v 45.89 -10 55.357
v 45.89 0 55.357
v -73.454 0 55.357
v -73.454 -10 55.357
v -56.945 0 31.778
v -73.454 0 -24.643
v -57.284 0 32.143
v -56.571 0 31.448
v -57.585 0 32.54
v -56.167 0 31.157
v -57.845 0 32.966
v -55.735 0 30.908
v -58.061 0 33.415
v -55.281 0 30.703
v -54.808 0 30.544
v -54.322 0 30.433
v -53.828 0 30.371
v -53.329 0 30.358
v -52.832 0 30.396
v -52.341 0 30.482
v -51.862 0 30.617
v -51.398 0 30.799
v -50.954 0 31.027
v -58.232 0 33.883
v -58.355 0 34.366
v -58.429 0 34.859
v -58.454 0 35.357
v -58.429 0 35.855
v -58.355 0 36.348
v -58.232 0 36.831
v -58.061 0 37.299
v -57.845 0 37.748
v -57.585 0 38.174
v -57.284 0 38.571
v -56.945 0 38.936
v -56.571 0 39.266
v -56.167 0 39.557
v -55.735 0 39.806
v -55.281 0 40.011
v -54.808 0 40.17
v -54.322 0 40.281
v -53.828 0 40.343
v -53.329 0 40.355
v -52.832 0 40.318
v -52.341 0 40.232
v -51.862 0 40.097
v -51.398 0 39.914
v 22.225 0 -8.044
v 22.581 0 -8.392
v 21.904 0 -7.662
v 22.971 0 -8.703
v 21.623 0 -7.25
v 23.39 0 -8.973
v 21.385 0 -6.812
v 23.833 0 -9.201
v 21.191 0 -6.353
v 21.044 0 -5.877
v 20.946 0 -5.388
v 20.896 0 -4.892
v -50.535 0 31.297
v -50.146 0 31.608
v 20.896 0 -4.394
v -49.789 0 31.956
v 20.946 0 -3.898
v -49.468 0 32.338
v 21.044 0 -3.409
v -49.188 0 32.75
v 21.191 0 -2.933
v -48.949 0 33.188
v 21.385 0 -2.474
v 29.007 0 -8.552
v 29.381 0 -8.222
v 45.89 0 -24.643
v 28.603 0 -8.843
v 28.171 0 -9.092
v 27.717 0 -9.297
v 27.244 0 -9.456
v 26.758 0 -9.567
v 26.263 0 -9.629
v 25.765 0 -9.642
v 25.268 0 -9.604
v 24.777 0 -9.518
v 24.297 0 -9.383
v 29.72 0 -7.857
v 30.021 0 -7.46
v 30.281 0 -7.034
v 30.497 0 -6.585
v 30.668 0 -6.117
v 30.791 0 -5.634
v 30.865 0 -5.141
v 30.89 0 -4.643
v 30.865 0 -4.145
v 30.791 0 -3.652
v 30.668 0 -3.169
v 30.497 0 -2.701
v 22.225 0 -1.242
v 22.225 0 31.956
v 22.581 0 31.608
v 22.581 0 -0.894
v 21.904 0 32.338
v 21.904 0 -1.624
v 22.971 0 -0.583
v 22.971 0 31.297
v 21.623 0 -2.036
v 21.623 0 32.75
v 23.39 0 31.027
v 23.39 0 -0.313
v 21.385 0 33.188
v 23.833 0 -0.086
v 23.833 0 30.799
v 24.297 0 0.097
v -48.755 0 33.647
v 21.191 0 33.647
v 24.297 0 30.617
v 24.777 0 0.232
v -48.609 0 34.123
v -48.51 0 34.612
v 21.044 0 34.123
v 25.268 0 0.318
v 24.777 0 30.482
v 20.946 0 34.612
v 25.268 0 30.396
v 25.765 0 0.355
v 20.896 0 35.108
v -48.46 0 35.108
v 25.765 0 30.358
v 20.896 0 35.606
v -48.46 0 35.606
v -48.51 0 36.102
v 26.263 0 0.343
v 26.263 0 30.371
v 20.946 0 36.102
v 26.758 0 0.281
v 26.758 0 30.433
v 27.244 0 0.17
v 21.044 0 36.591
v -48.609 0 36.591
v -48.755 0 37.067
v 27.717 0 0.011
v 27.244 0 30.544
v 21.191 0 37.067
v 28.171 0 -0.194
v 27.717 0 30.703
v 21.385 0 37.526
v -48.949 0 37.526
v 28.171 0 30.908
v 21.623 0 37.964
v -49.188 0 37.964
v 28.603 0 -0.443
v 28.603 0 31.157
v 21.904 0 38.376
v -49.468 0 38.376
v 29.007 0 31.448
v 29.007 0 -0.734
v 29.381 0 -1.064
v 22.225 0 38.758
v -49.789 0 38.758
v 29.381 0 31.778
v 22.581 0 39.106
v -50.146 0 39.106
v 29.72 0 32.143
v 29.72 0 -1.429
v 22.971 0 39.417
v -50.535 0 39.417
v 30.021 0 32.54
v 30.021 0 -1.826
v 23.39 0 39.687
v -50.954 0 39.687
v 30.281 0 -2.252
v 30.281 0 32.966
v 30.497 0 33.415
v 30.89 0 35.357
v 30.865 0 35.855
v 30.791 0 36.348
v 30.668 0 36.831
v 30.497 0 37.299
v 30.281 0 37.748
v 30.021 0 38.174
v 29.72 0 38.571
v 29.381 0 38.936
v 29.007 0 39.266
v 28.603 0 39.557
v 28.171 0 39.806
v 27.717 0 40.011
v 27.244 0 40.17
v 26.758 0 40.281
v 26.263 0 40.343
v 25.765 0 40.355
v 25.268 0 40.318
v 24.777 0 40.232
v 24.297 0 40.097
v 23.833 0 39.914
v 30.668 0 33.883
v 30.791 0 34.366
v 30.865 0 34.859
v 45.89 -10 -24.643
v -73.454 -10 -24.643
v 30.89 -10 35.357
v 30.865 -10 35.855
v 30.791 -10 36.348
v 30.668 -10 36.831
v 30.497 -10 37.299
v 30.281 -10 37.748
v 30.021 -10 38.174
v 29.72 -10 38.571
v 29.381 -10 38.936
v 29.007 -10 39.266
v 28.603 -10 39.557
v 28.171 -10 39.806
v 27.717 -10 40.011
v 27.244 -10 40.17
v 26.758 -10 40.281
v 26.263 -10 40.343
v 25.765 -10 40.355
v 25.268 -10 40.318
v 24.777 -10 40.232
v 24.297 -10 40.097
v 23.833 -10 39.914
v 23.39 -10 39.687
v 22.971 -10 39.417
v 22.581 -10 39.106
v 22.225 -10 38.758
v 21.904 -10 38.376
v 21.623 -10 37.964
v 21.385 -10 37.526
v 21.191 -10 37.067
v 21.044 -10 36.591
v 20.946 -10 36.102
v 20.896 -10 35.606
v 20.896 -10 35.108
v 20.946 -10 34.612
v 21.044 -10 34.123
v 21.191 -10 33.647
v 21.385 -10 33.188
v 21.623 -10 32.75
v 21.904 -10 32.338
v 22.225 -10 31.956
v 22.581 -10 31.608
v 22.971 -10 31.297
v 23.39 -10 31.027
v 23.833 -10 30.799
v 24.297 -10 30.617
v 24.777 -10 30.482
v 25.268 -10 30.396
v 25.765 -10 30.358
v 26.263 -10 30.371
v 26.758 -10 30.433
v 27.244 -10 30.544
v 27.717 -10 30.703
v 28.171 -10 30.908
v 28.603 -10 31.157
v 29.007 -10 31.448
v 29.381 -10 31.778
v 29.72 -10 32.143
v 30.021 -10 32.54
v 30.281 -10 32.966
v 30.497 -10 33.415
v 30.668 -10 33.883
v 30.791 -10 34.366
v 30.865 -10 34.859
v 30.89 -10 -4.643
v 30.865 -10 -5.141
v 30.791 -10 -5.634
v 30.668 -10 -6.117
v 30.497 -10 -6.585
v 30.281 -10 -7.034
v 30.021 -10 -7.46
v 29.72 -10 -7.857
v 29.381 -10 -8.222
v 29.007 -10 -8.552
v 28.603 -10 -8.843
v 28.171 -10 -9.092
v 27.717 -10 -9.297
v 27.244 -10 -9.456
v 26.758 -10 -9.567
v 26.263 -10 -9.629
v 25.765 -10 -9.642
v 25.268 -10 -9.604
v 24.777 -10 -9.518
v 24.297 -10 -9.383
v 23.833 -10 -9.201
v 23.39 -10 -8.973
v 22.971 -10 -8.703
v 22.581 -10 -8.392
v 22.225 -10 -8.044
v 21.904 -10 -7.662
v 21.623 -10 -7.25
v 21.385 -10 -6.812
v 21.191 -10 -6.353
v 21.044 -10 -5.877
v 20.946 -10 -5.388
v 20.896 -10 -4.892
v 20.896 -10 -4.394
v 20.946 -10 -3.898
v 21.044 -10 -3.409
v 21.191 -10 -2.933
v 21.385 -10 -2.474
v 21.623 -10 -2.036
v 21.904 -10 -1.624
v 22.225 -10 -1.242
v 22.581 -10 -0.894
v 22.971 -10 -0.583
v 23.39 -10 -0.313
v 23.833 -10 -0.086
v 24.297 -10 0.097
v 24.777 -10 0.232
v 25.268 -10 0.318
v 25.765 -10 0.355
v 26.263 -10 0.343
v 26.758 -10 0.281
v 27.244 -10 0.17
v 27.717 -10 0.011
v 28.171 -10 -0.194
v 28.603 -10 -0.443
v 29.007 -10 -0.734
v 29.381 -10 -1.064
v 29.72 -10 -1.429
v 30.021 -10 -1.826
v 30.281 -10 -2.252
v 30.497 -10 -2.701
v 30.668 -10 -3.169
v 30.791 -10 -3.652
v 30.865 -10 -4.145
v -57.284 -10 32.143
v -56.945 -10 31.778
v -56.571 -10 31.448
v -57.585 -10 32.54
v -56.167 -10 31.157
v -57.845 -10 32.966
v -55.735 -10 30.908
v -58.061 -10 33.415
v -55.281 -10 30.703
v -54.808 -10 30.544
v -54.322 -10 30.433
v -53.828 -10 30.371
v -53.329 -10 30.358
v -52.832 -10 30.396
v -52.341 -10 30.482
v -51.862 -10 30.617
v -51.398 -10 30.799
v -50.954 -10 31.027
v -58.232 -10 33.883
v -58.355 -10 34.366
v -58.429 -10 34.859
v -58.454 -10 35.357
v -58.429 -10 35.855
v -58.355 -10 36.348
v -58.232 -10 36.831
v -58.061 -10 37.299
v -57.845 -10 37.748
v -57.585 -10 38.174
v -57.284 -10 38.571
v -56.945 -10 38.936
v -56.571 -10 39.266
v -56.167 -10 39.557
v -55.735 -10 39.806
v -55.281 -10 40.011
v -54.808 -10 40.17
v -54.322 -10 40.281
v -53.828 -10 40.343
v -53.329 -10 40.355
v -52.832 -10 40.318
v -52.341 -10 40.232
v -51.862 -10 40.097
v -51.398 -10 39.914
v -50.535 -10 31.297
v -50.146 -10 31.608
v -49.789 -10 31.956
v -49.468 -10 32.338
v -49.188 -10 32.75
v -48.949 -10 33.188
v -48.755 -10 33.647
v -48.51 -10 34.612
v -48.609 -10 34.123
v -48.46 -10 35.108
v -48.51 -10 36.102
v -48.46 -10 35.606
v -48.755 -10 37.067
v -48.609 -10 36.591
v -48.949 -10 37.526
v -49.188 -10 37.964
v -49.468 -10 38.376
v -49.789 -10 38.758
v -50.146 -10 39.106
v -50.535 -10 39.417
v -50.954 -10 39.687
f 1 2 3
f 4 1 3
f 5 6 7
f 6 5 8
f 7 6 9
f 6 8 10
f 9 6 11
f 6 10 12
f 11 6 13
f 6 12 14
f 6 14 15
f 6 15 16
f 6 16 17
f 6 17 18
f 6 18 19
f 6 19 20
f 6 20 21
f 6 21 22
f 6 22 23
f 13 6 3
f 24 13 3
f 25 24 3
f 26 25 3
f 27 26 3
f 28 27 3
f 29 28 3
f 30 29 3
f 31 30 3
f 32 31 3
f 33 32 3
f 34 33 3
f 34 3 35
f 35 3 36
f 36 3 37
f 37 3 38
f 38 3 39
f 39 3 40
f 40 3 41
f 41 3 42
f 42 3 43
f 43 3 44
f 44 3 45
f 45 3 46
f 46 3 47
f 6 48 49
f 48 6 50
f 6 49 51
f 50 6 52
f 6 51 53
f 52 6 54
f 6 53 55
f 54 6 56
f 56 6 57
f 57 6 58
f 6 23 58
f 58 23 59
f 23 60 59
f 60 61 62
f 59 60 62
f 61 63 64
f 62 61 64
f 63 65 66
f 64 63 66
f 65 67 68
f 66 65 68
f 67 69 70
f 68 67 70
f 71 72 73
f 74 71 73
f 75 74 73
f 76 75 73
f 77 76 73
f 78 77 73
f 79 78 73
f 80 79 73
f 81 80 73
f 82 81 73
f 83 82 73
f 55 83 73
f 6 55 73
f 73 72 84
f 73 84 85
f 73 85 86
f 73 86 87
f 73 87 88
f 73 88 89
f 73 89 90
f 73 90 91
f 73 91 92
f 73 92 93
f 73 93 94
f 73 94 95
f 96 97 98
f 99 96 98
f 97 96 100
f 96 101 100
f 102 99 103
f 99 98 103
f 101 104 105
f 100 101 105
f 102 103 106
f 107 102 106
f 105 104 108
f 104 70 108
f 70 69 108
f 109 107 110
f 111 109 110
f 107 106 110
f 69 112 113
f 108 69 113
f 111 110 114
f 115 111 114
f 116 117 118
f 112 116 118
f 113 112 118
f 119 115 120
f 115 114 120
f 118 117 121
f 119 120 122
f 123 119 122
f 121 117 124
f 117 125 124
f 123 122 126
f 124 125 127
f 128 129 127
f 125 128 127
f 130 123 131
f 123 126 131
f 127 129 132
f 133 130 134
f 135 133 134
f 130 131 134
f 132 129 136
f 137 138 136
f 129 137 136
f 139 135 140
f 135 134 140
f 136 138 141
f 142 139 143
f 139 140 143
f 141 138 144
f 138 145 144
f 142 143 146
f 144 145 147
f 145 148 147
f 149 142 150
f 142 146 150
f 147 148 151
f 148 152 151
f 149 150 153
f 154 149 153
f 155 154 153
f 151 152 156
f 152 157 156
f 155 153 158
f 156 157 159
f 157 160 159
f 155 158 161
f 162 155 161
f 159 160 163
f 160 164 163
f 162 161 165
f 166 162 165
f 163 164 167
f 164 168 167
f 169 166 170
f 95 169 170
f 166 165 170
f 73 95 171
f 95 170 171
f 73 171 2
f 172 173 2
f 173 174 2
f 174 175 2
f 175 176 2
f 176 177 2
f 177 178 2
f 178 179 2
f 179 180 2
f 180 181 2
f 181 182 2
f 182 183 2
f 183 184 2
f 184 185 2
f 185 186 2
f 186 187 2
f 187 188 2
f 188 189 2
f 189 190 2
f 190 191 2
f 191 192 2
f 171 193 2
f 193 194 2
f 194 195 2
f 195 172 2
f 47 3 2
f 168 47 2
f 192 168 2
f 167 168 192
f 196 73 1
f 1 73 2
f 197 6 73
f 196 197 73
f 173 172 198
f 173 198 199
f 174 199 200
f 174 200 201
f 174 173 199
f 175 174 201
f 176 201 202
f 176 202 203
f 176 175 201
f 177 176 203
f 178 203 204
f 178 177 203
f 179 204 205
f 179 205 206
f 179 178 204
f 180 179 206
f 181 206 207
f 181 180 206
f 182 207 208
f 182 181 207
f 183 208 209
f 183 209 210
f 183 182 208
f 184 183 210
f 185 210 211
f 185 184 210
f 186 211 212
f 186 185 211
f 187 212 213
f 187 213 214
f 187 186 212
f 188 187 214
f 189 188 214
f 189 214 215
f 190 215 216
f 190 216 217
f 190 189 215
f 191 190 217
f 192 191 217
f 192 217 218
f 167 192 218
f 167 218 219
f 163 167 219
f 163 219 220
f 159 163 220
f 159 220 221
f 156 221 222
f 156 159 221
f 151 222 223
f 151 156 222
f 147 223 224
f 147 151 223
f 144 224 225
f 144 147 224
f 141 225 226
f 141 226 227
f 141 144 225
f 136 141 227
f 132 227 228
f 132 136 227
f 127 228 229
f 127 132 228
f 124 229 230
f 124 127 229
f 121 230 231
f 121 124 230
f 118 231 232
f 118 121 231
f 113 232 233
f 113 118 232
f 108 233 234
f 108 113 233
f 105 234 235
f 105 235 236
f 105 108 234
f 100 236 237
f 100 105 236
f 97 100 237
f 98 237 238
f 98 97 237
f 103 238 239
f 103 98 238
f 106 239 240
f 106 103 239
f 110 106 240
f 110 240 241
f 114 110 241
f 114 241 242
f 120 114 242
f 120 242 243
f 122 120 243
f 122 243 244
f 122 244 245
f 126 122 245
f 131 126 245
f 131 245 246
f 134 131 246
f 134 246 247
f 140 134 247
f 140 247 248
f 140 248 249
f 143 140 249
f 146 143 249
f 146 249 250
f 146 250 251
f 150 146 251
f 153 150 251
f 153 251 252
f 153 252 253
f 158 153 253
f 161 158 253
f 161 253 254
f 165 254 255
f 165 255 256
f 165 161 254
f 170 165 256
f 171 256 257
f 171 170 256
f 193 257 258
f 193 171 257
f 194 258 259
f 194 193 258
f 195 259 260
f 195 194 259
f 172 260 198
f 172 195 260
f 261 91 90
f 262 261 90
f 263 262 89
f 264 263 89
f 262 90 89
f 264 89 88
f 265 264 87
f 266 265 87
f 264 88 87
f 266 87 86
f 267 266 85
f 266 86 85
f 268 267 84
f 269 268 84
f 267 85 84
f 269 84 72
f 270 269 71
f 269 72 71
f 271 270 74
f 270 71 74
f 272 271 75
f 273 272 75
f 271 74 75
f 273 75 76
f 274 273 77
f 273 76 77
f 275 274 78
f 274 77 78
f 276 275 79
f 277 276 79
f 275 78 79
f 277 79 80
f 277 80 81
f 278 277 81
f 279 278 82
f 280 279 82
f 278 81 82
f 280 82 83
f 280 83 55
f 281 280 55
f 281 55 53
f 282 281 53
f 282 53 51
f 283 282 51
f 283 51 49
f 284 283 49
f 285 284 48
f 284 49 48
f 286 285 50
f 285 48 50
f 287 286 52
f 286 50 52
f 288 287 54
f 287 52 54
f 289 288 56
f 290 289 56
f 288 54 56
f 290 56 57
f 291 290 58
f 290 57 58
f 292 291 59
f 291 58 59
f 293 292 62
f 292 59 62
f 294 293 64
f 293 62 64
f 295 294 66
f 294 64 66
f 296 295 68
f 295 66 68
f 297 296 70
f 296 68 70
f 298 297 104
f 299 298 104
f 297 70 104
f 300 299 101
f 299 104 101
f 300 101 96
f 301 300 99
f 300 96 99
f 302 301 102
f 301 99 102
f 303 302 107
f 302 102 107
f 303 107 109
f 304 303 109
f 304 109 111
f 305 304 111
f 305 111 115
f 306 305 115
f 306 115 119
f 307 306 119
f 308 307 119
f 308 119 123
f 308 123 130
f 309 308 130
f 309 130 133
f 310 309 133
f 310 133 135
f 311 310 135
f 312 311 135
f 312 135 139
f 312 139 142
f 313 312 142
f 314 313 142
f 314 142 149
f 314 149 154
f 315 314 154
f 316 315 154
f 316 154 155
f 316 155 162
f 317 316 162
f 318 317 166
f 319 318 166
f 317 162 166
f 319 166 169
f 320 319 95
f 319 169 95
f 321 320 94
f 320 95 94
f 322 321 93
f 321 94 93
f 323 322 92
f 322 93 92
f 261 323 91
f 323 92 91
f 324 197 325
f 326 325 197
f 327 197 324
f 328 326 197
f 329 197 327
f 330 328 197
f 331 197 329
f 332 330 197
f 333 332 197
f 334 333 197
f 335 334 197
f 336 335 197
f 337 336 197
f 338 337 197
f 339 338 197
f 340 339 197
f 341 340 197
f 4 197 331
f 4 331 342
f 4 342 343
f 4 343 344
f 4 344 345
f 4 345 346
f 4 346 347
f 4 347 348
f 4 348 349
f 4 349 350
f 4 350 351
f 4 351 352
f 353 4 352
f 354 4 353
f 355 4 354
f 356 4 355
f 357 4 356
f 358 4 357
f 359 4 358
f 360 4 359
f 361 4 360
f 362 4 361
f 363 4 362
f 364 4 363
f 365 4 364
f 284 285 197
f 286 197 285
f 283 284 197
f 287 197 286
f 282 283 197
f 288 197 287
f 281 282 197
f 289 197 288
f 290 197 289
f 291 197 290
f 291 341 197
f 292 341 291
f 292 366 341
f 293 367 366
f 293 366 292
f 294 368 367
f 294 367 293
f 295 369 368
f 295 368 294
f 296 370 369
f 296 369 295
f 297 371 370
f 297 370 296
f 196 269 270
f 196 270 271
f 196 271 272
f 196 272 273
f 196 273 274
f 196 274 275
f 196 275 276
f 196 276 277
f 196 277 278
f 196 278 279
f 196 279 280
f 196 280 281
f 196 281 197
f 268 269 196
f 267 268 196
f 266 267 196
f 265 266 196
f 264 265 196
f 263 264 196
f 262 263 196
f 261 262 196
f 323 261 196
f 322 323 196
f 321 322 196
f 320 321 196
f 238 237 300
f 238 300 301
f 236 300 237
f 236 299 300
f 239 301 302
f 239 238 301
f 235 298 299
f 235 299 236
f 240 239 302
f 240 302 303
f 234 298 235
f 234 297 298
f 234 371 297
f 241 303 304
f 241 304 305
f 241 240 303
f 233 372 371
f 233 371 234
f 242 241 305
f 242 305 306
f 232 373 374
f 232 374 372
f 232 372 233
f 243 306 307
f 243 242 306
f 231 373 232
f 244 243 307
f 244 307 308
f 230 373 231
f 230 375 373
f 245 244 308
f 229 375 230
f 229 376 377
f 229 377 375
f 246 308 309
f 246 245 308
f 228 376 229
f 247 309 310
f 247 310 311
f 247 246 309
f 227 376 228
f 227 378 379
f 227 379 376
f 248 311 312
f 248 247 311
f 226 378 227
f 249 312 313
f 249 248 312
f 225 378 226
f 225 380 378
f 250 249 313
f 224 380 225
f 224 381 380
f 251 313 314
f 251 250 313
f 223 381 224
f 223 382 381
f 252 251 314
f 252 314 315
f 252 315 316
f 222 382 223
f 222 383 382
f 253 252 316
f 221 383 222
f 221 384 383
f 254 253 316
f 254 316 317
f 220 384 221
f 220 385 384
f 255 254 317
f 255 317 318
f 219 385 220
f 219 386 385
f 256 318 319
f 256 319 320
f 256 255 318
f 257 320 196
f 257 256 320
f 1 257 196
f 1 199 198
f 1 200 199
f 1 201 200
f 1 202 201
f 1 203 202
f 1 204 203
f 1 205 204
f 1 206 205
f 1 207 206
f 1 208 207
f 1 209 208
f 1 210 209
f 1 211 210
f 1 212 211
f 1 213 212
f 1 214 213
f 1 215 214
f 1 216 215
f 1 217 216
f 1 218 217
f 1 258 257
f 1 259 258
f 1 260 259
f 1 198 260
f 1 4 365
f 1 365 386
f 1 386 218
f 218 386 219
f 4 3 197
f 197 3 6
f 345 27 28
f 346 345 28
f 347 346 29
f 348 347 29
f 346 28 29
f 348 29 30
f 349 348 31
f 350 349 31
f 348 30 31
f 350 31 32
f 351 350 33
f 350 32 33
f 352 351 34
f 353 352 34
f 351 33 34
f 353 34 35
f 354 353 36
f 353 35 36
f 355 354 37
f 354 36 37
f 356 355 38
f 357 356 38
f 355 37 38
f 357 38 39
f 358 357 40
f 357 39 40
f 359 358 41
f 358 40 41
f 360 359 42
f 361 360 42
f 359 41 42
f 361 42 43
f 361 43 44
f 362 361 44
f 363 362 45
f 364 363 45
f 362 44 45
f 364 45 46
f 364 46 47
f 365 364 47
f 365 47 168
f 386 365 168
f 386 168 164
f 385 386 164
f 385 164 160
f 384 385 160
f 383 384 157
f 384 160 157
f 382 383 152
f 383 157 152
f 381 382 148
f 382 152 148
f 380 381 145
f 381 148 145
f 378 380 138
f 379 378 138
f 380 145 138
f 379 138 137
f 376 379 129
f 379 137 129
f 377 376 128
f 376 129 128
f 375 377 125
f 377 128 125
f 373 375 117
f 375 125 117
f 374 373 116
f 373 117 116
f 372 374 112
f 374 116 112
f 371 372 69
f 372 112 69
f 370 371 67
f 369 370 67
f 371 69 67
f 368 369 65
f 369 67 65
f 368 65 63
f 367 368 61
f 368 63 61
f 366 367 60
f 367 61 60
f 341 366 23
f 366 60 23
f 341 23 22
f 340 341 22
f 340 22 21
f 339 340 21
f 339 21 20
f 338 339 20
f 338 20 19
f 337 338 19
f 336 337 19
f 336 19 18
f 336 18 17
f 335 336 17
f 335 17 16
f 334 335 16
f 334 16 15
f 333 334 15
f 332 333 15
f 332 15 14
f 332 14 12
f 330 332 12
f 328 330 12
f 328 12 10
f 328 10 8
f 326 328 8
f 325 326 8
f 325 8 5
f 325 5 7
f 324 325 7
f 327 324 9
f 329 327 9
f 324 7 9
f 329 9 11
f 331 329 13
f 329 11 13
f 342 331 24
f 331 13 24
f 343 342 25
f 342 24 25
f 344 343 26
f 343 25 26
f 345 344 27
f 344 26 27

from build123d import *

# Parameters (mm, degrees)
F0_R     = 5
F1_DEPTH = 10


# Not quite as in the source:
# - the program builds the solid bodies; features that only make, move or delete a surface that nothing else refers to are left out


with BuildPart() as f1:
    # F0 (on Front) → F1 (new body)
    with BuildSketch(Plane.XZ):
        Polygon((45.889818927, 55.3569364734), (-73.4539608263, 55.3569364734), (-73.4539608263, 35.3569364734), (-73.4539608263, 5.3569364734), (45.889818927, 5.3569364734), (45.889818927, 35.3569364734), align=None)
        with BuildLine():
            ThreePointArc((-48.4539608263, 35.3569364734), (-53.4539608263, 30.3569364734), (-58.4539608263, 35.3569364734))
            ThreePointArc((-58.4539608263, 35.3569364734), (-53.4539608263, 40.3569364734), (-48.4539608263, 35.3569364734))
        make_face(mode=Mode.SUBTRACT)
        with Locations((25.889818927, 35.3569364734)):
            Circle(F0_R, mode=Mode.SUBTRACT)
        with BuildLine():
            Line((45.889818927, 5.3569364734), (-73.4539608263, 5.3569364734))
            Line((-73.4539608263, 5.3569364734), (-73.4539608263, -4.6430635266))
            Line((-73.4539608263, -4.6430635266), (20.889818927, -4.6430635266))
            ThreePointArc((20.889818927, -4.6430635266), (25.889818927, 0.3569364734), (30.889818927, -4.6430635266))
            Line((30.889818927, -4.6430635266), (45.889818927, -4.6430635266))
            Line((45.889818927, -4.6430635266), (45.889818927, 5.3569364734))
        make_face()
        with BuildLine():
            Line((20.889818927, -4.6430635266), (-73.4539608263, -4.6430635266))
            Line((-73.4539608263, -4.6430635266), (-73.4539608263, -24.6430635266))
            Line((-73.4539608263, -24.6430635266), (25.4732109606, -24.6430635266))
            Line((25.4732109606, -24.6430635266), (45.889818927, -24.6430635266))
            Line((45.889818927, -24.6430635266), (45.889818927, -4.6430635266))
            Line((45.889818927, -4.6430635266), (30.889818927, -4.6430635266))
            ThreePointArc((30.889818927, -4.6430635266), (25.889818927, -9.6430635266), (20.889818927, -4.6430635266))
        make_face()
    extrude(amount=F1_DEPTH)


solid = f1.part
